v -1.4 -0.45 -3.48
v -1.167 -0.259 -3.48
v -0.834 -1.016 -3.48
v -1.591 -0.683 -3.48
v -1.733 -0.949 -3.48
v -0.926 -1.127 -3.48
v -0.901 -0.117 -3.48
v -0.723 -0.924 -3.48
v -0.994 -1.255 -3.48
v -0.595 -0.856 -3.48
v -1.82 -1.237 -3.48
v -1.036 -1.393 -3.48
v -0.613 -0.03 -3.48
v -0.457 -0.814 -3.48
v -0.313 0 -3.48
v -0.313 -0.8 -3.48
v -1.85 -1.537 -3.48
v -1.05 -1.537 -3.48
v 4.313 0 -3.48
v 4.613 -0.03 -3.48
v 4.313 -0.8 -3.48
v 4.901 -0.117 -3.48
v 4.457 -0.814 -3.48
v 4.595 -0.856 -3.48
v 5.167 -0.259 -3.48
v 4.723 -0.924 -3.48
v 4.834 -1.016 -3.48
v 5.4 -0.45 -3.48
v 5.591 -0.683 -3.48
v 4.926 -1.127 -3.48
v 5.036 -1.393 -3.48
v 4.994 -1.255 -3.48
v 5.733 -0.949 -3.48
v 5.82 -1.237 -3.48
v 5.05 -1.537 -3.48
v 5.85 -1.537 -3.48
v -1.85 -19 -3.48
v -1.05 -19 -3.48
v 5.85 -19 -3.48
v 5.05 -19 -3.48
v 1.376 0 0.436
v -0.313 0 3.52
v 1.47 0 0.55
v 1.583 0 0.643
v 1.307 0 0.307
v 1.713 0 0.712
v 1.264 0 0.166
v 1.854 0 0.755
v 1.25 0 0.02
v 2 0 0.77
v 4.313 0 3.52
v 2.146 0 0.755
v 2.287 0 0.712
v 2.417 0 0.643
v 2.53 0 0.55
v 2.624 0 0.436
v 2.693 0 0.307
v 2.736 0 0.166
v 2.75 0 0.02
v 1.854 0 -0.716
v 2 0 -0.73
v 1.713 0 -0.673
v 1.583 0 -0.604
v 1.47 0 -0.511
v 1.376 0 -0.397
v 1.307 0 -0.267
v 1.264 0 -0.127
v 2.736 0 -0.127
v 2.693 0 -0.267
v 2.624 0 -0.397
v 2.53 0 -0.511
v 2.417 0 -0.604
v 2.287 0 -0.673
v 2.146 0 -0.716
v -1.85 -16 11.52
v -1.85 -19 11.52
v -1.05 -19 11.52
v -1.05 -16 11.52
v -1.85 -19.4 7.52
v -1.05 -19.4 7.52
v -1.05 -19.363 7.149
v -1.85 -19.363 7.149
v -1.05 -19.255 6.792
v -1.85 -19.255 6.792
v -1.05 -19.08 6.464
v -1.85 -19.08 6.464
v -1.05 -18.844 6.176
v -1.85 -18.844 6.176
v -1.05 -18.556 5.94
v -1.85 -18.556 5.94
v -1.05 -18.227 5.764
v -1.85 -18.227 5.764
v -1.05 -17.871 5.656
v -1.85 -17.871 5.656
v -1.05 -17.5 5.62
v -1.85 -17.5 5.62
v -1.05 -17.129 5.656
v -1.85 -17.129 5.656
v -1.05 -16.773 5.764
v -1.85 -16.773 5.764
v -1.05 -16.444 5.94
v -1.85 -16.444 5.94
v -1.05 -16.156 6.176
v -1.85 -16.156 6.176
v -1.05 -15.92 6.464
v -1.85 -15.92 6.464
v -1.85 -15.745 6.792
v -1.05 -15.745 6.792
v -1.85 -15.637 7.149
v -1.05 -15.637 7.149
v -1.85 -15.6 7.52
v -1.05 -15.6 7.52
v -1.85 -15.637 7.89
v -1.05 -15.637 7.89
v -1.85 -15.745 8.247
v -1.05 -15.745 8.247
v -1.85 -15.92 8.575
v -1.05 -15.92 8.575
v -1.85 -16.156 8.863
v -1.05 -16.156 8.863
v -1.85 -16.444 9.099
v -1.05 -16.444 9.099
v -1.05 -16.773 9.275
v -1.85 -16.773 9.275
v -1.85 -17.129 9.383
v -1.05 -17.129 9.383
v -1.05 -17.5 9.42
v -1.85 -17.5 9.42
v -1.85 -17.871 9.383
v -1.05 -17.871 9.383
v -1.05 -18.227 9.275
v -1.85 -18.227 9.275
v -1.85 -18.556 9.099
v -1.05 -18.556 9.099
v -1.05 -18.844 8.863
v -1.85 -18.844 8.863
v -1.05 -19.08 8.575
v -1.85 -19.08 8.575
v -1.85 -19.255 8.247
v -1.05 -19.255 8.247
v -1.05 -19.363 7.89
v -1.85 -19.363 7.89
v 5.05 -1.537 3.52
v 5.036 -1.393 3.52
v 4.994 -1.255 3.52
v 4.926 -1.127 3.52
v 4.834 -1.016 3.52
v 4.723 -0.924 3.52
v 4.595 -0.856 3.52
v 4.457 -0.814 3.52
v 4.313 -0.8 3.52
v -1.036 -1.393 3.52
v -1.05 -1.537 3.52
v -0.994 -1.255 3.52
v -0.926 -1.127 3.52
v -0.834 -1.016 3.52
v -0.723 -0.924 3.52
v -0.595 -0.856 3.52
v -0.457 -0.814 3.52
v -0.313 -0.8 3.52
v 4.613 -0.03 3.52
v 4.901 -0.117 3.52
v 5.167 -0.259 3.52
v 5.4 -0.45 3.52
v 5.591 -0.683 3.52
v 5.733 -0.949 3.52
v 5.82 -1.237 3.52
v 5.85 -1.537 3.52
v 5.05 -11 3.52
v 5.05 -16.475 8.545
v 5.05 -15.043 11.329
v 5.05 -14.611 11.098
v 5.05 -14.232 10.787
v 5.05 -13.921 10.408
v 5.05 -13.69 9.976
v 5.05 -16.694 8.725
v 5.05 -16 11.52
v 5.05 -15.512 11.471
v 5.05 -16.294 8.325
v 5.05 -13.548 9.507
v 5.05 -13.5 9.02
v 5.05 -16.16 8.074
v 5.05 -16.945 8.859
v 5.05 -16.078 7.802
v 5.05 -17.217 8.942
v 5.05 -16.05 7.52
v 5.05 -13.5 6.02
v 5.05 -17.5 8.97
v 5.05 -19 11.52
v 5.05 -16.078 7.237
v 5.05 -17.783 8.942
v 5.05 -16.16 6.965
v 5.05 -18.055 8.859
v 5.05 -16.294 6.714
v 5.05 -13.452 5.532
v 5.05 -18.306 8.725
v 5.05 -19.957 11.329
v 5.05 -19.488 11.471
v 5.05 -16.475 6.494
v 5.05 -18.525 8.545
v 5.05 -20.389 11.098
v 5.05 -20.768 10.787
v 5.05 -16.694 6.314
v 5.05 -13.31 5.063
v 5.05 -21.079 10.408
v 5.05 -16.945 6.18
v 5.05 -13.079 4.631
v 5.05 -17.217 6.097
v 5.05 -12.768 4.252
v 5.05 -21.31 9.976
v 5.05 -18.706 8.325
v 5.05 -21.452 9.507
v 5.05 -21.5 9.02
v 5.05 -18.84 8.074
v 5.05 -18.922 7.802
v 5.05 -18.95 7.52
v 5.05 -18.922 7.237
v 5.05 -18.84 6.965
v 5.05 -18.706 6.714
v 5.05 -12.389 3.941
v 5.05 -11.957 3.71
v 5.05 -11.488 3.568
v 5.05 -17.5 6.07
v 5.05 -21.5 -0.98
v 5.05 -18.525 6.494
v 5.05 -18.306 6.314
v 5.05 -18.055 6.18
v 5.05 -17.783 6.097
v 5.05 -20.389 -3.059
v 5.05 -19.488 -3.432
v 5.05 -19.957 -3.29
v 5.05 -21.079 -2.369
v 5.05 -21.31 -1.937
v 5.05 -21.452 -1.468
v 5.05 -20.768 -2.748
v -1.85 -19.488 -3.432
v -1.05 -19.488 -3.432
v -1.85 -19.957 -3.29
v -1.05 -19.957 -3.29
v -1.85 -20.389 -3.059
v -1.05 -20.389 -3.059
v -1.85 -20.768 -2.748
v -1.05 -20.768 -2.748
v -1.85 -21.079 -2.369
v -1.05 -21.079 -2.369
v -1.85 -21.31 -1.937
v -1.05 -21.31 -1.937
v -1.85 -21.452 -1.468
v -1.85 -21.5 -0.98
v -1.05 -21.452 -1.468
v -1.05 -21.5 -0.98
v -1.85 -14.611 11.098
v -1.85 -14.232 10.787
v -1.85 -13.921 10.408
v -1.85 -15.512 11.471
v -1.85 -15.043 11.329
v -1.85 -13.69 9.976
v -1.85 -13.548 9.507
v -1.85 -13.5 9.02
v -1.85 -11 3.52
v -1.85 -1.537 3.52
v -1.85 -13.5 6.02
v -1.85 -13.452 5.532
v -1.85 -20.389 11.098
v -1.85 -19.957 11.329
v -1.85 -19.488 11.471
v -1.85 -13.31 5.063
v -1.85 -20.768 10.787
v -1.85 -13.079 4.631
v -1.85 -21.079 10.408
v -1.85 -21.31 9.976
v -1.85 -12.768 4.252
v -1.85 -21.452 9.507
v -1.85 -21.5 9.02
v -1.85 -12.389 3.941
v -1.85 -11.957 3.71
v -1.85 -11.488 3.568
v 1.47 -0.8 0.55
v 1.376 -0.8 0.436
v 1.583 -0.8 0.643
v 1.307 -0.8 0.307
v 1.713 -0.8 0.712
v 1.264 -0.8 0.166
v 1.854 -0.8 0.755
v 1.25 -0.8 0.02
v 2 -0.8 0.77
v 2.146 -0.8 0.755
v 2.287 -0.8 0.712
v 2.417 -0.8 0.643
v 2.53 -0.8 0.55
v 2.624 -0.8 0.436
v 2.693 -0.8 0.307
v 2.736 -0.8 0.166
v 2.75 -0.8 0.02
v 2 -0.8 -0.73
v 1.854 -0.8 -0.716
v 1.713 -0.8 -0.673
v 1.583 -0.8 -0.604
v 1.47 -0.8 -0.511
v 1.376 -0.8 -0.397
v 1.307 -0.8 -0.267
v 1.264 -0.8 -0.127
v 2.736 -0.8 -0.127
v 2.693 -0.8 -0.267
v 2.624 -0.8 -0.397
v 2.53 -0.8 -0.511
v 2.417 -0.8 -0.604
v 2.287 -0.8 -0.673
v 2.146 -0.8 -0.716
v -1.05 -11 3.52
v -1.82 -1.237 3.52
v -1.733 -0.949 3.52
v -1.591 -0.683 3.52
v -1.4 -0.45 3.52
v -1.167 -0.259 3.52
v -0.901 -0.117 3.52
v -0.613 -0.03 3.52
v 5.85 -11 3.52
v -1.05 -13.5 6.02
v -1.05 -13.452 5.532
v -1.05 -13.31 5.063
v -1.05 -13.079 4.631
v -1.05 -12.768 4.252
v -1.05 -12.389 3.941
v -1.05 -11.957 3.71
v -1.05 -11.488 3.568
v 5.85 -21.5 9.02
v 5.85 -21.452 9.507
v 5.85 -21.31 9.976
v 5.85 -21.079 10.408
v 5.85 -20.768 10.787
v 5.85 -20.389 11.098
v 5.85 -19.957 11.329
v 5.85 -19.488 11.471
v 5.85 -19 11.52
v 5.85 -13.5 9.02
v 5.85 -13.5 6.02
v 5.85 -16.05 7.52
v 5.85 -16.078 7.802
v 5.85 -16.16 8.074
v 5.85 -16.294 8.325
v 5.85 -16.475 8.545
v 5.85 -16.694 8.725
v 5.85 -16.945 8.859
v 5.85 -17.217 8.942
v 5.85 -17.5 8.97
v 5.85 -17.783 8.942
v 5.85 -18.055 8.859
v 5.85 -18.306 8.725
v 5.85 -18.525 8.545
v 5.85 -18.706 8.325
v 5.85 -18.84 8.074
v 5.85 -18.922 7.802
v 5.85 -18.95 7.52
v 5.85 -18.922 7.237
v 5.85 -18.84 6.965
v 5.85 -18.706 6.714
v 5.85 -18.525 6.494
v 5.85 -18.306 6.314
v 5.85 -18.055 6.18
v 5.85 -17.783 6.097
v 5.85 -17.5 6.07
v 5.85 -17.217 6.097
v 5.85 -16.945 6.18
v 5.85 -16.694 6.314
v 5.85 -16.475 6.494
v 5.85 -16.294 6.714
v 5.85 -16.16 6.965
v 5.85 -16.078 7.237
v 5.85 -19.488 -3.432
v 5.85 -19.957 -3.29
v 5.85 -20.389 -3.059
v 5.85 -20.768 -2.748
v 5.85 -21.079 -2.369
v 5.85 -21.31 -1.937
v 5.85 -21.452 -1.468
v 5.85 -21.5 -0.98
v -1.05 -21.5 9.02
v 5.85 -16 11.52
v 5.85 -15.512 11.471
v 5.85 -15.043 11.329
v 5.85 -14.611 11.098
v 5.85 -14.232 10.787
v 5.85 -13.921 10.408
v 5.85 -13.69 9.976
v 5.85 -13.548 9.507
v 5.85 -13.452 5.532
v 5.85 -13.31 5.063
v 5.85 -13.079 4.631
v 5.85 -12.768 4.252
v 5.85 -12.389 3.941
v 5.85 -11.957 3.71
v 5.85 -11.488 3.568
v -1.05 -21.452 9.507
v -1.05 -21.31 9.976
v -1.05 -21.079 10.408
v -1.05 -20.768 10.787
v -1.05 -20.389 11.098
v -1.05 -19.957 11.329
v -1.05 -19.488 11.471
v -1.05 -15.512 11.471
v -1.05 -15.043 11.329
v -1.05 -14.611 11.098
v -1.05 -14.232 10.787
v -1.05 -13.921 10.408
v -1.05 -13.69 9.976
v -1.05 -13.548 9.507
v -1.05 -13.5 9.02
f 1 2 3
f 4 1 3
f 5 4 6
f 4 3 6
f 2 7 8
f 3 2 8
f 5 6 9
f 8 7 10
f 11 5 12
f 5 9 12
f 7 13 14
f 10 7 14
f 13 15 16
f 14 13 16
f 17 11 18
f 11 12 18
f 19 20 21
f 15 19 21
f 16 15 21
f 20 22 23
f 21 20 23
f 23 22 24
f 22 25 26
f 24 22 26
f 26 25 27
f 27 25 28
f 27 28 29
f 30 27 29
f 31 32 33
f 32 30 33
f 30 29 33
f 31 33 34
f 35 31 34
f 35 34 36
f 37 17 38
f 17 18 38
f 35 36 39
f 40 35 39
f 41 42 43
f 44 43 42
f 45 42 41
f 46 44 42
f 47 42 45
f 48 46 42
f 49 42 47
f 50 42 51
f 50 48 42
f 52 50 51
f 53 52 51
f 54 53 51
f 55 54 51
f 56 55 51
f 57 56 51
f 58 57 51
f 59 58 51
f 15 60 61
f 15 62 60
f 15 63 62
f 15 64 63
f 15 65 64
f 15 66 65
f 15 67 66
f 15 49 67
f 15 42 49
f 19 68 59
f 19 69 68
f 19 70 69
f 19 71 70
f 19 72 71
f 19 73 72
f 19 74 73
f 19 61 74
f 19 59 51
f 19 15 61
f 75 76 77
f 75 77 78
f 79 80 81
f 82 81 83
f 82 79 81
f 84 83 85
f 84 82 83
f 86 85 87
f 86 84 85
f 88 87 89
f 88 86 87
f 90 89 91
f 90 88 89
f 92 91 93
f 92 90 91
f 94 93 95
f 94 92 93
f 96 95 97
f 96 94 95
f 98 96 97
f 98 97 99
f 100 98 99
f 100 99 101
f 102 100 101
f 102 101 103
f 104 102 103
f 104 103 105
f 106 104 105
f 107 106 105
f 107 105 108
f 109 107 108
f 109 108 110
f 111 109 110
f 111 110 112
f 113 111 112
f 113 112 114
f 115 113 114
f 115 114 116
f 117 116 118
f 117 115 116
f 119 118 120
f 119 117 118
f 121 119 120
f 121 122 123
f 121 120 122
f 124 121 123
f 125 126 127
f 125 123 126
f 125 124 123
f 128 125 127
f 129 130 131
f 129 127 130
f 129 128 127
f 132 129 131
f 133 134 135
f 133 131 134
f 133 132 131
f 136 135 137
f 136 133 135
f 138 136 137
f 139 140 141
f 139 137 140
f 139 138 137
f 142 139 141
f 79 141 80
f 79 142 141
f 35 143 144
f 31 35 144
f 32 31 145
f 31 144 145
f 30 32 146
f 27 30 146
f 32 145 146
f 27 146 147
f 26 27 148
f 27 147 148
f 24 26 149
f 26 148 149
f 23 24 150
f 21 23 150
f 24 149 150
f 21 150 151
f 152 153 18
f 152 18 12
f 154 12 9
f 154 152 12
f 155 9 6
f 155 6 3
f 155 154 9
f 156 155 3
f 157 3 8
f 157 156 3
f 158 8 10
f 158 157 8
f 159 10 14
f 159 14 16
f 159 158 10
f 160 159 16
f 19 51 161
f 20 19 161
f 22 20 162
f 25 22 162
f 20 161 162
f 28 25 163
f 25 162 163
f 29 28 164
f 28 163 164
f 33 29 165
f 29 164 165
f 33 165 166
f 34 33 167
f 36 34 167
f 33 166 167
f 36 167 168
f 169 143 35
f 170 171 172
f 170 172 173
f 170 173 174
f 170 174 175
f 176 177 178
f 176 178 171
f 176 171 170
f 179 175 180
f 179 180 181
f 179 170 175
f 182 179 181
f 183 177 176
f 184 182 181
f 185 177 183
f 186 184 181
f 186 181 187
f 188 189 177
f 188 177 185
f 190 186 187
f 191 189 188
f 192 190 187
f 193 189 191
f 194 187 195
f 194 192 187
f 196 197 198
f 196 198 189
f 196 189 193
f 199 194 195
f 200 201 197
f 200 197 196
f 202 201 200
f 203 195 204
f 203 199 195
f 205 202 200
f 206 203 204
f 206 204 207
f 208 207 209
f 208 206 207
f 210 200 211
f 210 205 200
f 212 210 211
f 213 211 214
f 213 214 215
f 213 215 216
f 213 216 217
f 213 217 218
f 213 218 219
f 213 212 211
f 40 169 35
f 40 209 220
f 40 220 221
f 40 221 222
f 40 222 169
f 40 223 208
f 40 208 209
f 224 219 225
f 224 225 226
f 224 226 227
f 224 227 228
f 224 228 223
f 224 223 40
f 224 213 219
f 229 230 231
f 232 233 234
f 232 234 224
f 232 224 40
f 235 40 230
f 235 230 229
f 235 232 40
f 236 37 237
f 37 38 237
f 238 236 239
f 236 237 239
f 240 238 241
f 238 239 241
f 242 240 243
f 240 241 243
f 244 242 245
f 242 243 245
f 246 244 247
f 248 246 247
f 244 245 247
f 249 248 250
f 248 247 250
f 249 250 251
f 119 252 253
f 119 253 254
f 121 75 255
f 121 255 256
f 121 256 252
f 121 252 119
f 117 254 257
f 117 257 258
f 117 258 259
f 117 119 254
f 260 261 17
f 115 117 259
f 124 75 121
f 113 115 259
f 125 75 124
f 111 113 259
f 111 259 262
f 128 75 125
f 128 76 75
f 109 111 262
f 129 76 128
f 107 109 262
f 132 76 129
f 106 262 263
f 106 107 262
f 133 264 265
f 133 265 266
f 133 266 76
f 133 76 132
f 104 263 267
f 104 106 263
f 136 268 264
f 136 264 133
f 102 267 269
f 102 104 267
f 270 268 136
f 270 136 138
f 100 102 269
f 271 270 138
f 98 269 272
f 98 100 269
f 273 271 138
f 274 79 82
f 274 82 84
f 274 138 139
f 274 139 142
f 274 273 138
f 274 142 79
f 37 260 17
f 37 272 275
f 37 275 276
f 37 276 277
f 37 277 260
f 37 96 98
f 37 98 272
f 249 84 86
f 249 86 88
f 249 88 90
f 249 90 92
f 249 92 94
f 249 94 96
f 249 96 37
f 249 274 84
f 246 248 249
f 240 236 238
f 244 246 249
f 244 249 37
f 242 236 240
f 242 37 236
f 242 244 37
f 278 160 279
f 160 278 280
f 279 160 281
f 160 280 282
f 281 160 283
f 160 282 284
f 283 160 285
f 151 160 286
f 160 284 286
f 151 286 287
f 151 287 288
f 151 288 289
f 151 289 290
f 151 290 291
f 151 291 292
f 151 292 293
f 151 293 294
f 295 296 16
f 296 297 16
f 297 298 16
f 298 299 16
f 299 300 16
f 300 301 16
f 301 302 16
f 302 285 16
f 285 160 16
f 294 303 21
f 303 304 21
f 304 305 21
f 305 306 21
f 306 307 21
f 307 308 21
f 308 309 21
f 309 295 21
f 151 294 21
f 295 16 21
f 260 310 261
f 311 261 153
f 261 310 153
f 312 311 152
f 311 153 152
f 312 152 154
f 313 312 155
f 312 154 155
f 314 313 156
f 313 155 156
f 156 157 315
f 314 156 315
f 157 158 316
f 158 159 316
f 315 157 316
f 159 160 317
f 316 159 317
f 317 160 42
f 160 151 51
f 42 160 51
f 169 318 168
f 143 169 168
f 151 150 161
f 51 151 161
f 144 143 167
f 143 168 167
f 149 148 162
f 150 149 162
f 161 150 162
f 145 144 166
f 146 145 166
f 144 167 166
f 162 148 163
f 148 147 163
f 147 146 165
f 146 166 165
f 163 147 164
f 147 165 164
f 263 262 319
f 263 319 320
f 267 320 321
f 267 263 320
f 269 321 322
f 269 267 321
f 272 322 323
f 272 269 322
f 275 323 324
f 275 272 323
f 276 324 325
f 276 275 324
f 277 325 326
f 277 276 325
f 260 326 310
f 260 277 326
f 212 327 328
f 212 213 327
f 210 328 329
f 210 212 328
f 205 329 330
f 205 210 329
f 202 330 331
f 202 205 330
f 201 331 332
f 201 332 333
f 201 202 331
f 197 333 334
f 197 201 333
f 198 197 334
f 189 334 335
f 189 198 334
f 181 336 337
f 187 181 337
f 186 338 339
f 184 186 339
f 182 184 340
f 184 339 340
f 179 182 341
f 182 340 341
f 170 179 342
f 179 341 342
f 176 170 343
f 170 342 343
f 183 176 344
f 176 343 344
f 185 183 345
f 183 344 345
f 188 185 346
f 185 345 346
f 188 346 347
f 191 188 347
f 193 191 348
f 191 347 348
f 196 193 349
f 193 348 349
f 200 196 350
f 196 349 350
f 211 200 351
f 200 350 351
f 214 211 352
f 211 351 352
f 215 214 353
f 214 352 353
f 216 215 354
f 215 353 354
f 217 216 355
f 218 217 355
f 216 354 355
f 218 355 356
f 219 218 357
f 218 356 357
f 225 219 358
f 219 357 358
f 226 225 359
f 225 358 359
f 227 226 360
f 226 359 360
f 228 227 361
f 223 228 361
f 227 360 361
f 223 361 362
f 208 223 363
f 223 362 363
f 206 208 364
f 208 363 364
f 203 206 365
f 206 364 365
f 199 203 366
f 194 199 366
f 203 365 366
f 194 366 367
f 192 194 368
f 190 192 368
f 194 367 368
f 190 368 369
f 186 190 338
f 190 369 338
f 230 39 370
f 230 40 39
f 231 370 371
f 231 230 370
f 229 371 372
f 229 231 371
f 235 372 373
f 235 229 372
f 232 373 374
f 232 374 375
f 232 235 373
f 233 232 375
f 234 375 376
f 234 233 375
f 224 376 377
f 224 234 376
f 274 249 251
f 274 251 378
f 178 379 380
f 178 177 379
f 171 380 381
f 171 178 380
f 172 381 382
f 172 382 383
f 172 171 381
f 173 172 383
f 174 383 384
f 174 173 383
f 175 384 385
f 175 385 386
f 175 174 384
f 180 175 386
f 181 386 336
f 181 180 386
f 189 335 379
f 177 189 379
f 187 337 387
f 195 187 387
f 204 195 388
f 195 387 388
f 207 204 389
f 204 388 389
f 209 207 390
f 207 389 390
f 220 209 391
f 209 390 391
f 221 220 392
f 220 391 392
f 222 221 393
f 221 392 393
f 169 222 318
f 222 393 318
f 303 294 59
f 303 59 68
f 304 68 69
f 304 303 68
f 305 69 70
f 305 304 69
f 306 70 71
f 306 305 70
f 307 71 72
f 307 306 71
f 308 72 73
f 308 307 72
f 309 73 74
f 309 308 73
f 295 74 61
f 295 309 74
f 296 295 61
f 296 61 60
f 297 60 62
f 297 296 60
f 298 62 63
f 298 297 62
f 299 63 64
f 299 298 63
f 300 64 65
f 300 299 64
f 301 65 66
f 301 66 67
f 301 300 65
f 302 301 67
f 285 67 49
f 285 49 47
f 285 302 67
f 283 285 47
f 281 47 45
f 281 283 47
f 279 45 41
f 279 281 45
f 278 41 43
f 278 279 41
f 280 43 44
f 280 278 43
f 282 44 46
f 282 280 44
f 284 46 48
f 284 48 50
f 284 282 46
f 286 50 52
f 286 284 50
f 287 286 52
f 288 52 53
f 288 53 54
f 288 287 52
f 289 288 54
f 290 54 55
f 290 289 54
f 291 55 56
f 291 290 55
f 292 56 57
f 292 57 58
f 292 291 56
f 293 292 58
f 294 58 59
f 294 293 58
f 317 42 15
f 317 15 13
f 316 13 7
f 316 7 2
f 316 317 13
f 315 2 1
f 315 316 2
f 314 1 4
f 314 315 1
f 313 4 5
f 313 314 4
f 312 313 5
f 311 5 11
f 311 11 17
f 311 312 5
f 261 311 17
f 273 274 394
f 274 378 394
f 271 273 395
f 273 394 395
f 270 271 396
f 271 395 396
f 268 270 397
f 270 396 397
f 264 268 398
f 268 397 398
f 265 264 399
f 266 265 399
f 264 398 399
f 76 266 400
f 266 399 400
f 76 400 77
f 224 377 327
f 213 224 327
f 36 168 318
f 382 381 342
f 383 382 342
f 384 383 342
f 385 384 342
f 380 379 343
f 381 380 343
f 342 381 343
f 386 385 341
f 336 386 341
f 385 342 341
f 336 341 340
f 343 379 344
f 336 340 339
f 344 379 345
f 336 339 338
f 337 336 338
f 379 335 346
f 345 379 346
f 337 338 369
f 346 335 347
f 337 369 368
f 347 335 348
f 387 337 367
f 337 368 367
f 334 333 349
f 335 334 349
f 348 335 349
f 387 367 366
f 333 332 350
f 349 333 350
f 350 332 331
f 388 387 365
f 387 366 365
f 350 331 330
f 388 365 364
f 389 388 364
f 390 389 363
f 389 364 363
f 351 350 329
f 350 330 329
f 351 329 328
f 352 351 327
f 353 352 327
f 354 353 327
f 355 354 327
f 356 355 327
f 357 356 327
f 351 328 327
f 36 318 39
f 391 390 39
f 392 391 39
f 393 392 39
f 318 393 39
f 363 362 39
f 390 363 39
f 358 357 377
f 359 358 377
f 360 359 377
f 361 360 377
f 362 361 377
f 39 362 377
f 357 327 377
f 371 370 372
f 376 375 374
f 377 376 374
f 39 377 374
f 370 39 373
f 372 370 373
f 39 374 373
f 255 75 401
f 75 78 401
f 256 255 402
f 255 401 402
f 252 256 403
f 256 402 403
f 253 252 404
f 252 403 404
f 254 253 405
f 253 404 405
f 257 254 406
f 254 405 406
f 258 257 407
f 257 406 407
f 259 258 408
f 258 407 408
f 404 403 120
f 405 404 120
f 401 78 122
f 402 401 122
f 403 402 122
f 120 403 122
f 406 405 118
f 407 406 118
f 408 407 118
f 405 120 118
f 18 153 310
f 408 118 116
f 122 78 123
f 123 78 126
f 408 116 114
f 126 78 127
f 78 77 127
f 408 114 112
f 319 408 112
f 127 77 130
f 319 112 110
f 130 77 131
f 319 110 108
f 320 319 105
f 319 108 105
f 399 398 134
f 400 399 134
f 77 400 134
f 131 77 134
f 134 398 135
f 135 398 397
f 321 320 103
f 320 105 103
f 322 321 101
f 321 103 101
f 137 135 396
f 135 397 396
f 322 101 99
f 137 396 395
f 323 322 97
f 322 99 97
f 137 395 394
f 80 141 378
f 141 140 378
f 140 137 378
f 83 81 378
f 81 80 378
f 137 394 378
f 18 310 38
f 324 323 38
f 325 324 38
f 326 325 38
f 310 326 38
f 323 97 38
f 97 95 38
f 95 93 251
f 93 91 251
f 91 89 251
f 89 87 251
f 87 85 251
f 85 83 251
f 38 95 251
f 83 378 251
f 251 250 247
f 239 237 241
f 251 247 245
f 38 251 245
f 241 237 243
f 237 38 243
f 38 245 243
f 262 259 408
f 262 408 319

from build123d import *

# Parameters (mm, degrees)
SKETCH1_W                    = 7.7
SKETCH1_H                    = 7
BASE_FLANGE1_DEPTH           = 0.8
EDGE_FLANGE2_STRIP_W         = 4.6732
EDGE_FLANGE2_STRIP_H         = 0.8
EDGE_FLANGE2_STRIP_CUT_DEPTH = 7
EDGE_FLANGE2_DEPTH           = 7
EDGE_FLANGE2_FLAT_DEPTH      = 0.8
HOLE1_START                  = -1.85
HOLE1_OUTLINE_R              = 1.45
HOLE1_DEPTH                  = 0.8
HOLE4_START                  = -0.8
HOLE4_OUTLINE_R              = 0.75
HOLE4_DEPTH                  = 0.8
FILLET1_R                    = 2.5
SKETCH24_R                   = 1.9
CUT_EXTRUDE1_DEPTH           = 1


# Read off the part's stored shape, not the designer's step: Hole1, Hole4
# Sheet-metal steps are written as plain solids
with BuildPart() as part:
    # Sketch1 → Base-Flange1 (new body)
    with BuildSketch(Plane(origin=(0, 0, 0), x_dir=(1, 0, 0), z_dir=(0, 1, 0))):
        with Locations((2, -0.01953125)):
            Rectangle(SKETCH1_W, SKETCH1_H)
    extrude(amount=-BASE_FLANGE1_DEPTH)

    # Edge-Flange2 strip (across the edge) → Edge-Flange2 strip cut (cut)
    with BuildSketch(Plane(origin=(-1.85, -0.8, 3.51953125), x_dir=(1, 0, 0), z_dir=(0, 0, -1))):
        with Locations((-0.8, -0.4)):
            Rectangle(EDGE_FLANGE2_STRIP_W, EDGE_FLANGE2_STRIP_H)
    edge_flange2_strip_cut = extrude(amount=EDGE_FLANGE2_STRIP_CUT_DEPTH, mode=Mode.SUBTRACT)

    # Edge-Flange2 bend section (across the edge) → Edge-Flange2 (add)
    with BuildSketch(Plane(origin=(-1.85, -0.8, 3.51953125), x_dir=(1, 0, 0), z_dir=(0, 0, -1))):
        with BuildLine():
            Line((0, 0.7366), (0.8, 0.7366))
            ThreePointArc((0.8, 0.7366), (1.015745145, 0.215745145), (1.5366, 0))
            Line((1.5366, 0), (1.5366, -0.8))
            ThreePointArc((1.5366, -0.8), (0.45005972, -0.34994028), (0, 0.7366))
        make_face()
    edge_flange2 = extrude(amount=EDGE_FLANGE2_DEPTH)

    # Edge-Flange2 profile (on flange) → Edge-Flange2 flat (add)
    with BuildSketch(Plane(origin=(-1.85, -0.8, 0), x_dir=(0, 0, -1), z_dir=(-1, 0, 0))):
        with BuildLine():
            Line((3.48046875, 0.7366), (3.48046875, 20.7))
            Line((3.48046875, 20.7), (-3.51953125, 20.7))
            Line((-3.51953125, 20.7), (-11.51953125, 20.7))
            Line((-11.51953125, 20.7), (-11.51953125, 12.7))
            Line((-11.51953125, 12.7), (-6.01953125, 12.7))
            ThreePointArc((-6.01953125, 12.7), (-4.251764297, 11.967766953), (-3.51953125, 10.2))
            Line((-3.51953125, 10.2), (-3.51953125, 0.7366))
            Line((-3.51953125, 0.7366), (3.48046875, 0.7366))
        make_face()
    edge_flange2_flat = extrude(amount=-EDGE_FLANGE2_FLAT_DEPTH)

    # Hole1 outline → Hole1 (cut)
    with BuildSketch(Plane.YZ.offset(HOLE1_START)):
        with Locations((-17.5, 7.51953125)):
            Circle(HOLE1_OUTLINE_R)
    hole1 = extrude(amount=HOLE1_DEPTH, mode=Mode.SUBTRACT)

    # Hole4 outline → Hole4 (cut)
    with BuildSketch(Plane(origin=(0, 0, 0), x_dir=(1, 0, 0), z_dir=(0, 1, 0)).offset(HOLE4_START)):
        with Locations((2, -0.01953125)):
            Circle(HOLE4_OUTLINE_R)
    extrude(amount=HOLE4_DEPTH, mode=Mode.SUBTRACT)

    # Mirror1: Edge-Flange2 strip cut, Edge-Flange2, Edge-Flange2 flat, Hole1 across plane
    add(edge_flange2_strip_cut.mirror(Plane(origin=(2, 0, 0), x_dir=(0, 0, 1), z_dir=(1, 0, 0))), mode=Mode.SUBTRACT)
    add(edge_flange2.mirror(Plane(origin=(2, 0, 0), x_dir=(0, 0, 1), z_dir=(1, 0, 0))))
    add(edge_flange2_flat.mirror(Plane(origin=(2, 0, 0), x_dir=(0, 0, 1), z_dir=(1, 0, 0))))
    add(hole1.mirror(Plane(origin=(2, 0, 0), x_dir=(0, 0, 1), z_dir=(1, 0, 0))), mode=Mode.SUBTRACT)

    # Fillet1
    fillet1_edges = [part.edges().sort_by_distance(p)[0] for p in [
        (-1.45, -21.5, -3.48046875),
        (-1.45, -21.5, 11.51953125),
        (-1.45, -13.5, 11.51953125),
        (5.45, -21.5, -3.48046875),
        (5.45, -13.5, 11.51953125),
        (5.45, -21.5, 11.51953125),
    ]]
    fillet(fillet1_edges, radius=FILLET1_R)

    # Sketch24 → Cut-Extrude1 (cut)
    with BuildSketch(Plane(origin=(-1.85, 0, 0), x_dir=(0, 0, -1), z_dir=(1, 0, 0))):
        with Locations(Location((-7.51953125, -17.5, 0), (0, 0, 270))):
            Circle(SKETCH24_R)
    extrude(amount=CUT_EXTRUDE1_DEPTH, mode=Mode.SUBTRACT)


solid = part.part
